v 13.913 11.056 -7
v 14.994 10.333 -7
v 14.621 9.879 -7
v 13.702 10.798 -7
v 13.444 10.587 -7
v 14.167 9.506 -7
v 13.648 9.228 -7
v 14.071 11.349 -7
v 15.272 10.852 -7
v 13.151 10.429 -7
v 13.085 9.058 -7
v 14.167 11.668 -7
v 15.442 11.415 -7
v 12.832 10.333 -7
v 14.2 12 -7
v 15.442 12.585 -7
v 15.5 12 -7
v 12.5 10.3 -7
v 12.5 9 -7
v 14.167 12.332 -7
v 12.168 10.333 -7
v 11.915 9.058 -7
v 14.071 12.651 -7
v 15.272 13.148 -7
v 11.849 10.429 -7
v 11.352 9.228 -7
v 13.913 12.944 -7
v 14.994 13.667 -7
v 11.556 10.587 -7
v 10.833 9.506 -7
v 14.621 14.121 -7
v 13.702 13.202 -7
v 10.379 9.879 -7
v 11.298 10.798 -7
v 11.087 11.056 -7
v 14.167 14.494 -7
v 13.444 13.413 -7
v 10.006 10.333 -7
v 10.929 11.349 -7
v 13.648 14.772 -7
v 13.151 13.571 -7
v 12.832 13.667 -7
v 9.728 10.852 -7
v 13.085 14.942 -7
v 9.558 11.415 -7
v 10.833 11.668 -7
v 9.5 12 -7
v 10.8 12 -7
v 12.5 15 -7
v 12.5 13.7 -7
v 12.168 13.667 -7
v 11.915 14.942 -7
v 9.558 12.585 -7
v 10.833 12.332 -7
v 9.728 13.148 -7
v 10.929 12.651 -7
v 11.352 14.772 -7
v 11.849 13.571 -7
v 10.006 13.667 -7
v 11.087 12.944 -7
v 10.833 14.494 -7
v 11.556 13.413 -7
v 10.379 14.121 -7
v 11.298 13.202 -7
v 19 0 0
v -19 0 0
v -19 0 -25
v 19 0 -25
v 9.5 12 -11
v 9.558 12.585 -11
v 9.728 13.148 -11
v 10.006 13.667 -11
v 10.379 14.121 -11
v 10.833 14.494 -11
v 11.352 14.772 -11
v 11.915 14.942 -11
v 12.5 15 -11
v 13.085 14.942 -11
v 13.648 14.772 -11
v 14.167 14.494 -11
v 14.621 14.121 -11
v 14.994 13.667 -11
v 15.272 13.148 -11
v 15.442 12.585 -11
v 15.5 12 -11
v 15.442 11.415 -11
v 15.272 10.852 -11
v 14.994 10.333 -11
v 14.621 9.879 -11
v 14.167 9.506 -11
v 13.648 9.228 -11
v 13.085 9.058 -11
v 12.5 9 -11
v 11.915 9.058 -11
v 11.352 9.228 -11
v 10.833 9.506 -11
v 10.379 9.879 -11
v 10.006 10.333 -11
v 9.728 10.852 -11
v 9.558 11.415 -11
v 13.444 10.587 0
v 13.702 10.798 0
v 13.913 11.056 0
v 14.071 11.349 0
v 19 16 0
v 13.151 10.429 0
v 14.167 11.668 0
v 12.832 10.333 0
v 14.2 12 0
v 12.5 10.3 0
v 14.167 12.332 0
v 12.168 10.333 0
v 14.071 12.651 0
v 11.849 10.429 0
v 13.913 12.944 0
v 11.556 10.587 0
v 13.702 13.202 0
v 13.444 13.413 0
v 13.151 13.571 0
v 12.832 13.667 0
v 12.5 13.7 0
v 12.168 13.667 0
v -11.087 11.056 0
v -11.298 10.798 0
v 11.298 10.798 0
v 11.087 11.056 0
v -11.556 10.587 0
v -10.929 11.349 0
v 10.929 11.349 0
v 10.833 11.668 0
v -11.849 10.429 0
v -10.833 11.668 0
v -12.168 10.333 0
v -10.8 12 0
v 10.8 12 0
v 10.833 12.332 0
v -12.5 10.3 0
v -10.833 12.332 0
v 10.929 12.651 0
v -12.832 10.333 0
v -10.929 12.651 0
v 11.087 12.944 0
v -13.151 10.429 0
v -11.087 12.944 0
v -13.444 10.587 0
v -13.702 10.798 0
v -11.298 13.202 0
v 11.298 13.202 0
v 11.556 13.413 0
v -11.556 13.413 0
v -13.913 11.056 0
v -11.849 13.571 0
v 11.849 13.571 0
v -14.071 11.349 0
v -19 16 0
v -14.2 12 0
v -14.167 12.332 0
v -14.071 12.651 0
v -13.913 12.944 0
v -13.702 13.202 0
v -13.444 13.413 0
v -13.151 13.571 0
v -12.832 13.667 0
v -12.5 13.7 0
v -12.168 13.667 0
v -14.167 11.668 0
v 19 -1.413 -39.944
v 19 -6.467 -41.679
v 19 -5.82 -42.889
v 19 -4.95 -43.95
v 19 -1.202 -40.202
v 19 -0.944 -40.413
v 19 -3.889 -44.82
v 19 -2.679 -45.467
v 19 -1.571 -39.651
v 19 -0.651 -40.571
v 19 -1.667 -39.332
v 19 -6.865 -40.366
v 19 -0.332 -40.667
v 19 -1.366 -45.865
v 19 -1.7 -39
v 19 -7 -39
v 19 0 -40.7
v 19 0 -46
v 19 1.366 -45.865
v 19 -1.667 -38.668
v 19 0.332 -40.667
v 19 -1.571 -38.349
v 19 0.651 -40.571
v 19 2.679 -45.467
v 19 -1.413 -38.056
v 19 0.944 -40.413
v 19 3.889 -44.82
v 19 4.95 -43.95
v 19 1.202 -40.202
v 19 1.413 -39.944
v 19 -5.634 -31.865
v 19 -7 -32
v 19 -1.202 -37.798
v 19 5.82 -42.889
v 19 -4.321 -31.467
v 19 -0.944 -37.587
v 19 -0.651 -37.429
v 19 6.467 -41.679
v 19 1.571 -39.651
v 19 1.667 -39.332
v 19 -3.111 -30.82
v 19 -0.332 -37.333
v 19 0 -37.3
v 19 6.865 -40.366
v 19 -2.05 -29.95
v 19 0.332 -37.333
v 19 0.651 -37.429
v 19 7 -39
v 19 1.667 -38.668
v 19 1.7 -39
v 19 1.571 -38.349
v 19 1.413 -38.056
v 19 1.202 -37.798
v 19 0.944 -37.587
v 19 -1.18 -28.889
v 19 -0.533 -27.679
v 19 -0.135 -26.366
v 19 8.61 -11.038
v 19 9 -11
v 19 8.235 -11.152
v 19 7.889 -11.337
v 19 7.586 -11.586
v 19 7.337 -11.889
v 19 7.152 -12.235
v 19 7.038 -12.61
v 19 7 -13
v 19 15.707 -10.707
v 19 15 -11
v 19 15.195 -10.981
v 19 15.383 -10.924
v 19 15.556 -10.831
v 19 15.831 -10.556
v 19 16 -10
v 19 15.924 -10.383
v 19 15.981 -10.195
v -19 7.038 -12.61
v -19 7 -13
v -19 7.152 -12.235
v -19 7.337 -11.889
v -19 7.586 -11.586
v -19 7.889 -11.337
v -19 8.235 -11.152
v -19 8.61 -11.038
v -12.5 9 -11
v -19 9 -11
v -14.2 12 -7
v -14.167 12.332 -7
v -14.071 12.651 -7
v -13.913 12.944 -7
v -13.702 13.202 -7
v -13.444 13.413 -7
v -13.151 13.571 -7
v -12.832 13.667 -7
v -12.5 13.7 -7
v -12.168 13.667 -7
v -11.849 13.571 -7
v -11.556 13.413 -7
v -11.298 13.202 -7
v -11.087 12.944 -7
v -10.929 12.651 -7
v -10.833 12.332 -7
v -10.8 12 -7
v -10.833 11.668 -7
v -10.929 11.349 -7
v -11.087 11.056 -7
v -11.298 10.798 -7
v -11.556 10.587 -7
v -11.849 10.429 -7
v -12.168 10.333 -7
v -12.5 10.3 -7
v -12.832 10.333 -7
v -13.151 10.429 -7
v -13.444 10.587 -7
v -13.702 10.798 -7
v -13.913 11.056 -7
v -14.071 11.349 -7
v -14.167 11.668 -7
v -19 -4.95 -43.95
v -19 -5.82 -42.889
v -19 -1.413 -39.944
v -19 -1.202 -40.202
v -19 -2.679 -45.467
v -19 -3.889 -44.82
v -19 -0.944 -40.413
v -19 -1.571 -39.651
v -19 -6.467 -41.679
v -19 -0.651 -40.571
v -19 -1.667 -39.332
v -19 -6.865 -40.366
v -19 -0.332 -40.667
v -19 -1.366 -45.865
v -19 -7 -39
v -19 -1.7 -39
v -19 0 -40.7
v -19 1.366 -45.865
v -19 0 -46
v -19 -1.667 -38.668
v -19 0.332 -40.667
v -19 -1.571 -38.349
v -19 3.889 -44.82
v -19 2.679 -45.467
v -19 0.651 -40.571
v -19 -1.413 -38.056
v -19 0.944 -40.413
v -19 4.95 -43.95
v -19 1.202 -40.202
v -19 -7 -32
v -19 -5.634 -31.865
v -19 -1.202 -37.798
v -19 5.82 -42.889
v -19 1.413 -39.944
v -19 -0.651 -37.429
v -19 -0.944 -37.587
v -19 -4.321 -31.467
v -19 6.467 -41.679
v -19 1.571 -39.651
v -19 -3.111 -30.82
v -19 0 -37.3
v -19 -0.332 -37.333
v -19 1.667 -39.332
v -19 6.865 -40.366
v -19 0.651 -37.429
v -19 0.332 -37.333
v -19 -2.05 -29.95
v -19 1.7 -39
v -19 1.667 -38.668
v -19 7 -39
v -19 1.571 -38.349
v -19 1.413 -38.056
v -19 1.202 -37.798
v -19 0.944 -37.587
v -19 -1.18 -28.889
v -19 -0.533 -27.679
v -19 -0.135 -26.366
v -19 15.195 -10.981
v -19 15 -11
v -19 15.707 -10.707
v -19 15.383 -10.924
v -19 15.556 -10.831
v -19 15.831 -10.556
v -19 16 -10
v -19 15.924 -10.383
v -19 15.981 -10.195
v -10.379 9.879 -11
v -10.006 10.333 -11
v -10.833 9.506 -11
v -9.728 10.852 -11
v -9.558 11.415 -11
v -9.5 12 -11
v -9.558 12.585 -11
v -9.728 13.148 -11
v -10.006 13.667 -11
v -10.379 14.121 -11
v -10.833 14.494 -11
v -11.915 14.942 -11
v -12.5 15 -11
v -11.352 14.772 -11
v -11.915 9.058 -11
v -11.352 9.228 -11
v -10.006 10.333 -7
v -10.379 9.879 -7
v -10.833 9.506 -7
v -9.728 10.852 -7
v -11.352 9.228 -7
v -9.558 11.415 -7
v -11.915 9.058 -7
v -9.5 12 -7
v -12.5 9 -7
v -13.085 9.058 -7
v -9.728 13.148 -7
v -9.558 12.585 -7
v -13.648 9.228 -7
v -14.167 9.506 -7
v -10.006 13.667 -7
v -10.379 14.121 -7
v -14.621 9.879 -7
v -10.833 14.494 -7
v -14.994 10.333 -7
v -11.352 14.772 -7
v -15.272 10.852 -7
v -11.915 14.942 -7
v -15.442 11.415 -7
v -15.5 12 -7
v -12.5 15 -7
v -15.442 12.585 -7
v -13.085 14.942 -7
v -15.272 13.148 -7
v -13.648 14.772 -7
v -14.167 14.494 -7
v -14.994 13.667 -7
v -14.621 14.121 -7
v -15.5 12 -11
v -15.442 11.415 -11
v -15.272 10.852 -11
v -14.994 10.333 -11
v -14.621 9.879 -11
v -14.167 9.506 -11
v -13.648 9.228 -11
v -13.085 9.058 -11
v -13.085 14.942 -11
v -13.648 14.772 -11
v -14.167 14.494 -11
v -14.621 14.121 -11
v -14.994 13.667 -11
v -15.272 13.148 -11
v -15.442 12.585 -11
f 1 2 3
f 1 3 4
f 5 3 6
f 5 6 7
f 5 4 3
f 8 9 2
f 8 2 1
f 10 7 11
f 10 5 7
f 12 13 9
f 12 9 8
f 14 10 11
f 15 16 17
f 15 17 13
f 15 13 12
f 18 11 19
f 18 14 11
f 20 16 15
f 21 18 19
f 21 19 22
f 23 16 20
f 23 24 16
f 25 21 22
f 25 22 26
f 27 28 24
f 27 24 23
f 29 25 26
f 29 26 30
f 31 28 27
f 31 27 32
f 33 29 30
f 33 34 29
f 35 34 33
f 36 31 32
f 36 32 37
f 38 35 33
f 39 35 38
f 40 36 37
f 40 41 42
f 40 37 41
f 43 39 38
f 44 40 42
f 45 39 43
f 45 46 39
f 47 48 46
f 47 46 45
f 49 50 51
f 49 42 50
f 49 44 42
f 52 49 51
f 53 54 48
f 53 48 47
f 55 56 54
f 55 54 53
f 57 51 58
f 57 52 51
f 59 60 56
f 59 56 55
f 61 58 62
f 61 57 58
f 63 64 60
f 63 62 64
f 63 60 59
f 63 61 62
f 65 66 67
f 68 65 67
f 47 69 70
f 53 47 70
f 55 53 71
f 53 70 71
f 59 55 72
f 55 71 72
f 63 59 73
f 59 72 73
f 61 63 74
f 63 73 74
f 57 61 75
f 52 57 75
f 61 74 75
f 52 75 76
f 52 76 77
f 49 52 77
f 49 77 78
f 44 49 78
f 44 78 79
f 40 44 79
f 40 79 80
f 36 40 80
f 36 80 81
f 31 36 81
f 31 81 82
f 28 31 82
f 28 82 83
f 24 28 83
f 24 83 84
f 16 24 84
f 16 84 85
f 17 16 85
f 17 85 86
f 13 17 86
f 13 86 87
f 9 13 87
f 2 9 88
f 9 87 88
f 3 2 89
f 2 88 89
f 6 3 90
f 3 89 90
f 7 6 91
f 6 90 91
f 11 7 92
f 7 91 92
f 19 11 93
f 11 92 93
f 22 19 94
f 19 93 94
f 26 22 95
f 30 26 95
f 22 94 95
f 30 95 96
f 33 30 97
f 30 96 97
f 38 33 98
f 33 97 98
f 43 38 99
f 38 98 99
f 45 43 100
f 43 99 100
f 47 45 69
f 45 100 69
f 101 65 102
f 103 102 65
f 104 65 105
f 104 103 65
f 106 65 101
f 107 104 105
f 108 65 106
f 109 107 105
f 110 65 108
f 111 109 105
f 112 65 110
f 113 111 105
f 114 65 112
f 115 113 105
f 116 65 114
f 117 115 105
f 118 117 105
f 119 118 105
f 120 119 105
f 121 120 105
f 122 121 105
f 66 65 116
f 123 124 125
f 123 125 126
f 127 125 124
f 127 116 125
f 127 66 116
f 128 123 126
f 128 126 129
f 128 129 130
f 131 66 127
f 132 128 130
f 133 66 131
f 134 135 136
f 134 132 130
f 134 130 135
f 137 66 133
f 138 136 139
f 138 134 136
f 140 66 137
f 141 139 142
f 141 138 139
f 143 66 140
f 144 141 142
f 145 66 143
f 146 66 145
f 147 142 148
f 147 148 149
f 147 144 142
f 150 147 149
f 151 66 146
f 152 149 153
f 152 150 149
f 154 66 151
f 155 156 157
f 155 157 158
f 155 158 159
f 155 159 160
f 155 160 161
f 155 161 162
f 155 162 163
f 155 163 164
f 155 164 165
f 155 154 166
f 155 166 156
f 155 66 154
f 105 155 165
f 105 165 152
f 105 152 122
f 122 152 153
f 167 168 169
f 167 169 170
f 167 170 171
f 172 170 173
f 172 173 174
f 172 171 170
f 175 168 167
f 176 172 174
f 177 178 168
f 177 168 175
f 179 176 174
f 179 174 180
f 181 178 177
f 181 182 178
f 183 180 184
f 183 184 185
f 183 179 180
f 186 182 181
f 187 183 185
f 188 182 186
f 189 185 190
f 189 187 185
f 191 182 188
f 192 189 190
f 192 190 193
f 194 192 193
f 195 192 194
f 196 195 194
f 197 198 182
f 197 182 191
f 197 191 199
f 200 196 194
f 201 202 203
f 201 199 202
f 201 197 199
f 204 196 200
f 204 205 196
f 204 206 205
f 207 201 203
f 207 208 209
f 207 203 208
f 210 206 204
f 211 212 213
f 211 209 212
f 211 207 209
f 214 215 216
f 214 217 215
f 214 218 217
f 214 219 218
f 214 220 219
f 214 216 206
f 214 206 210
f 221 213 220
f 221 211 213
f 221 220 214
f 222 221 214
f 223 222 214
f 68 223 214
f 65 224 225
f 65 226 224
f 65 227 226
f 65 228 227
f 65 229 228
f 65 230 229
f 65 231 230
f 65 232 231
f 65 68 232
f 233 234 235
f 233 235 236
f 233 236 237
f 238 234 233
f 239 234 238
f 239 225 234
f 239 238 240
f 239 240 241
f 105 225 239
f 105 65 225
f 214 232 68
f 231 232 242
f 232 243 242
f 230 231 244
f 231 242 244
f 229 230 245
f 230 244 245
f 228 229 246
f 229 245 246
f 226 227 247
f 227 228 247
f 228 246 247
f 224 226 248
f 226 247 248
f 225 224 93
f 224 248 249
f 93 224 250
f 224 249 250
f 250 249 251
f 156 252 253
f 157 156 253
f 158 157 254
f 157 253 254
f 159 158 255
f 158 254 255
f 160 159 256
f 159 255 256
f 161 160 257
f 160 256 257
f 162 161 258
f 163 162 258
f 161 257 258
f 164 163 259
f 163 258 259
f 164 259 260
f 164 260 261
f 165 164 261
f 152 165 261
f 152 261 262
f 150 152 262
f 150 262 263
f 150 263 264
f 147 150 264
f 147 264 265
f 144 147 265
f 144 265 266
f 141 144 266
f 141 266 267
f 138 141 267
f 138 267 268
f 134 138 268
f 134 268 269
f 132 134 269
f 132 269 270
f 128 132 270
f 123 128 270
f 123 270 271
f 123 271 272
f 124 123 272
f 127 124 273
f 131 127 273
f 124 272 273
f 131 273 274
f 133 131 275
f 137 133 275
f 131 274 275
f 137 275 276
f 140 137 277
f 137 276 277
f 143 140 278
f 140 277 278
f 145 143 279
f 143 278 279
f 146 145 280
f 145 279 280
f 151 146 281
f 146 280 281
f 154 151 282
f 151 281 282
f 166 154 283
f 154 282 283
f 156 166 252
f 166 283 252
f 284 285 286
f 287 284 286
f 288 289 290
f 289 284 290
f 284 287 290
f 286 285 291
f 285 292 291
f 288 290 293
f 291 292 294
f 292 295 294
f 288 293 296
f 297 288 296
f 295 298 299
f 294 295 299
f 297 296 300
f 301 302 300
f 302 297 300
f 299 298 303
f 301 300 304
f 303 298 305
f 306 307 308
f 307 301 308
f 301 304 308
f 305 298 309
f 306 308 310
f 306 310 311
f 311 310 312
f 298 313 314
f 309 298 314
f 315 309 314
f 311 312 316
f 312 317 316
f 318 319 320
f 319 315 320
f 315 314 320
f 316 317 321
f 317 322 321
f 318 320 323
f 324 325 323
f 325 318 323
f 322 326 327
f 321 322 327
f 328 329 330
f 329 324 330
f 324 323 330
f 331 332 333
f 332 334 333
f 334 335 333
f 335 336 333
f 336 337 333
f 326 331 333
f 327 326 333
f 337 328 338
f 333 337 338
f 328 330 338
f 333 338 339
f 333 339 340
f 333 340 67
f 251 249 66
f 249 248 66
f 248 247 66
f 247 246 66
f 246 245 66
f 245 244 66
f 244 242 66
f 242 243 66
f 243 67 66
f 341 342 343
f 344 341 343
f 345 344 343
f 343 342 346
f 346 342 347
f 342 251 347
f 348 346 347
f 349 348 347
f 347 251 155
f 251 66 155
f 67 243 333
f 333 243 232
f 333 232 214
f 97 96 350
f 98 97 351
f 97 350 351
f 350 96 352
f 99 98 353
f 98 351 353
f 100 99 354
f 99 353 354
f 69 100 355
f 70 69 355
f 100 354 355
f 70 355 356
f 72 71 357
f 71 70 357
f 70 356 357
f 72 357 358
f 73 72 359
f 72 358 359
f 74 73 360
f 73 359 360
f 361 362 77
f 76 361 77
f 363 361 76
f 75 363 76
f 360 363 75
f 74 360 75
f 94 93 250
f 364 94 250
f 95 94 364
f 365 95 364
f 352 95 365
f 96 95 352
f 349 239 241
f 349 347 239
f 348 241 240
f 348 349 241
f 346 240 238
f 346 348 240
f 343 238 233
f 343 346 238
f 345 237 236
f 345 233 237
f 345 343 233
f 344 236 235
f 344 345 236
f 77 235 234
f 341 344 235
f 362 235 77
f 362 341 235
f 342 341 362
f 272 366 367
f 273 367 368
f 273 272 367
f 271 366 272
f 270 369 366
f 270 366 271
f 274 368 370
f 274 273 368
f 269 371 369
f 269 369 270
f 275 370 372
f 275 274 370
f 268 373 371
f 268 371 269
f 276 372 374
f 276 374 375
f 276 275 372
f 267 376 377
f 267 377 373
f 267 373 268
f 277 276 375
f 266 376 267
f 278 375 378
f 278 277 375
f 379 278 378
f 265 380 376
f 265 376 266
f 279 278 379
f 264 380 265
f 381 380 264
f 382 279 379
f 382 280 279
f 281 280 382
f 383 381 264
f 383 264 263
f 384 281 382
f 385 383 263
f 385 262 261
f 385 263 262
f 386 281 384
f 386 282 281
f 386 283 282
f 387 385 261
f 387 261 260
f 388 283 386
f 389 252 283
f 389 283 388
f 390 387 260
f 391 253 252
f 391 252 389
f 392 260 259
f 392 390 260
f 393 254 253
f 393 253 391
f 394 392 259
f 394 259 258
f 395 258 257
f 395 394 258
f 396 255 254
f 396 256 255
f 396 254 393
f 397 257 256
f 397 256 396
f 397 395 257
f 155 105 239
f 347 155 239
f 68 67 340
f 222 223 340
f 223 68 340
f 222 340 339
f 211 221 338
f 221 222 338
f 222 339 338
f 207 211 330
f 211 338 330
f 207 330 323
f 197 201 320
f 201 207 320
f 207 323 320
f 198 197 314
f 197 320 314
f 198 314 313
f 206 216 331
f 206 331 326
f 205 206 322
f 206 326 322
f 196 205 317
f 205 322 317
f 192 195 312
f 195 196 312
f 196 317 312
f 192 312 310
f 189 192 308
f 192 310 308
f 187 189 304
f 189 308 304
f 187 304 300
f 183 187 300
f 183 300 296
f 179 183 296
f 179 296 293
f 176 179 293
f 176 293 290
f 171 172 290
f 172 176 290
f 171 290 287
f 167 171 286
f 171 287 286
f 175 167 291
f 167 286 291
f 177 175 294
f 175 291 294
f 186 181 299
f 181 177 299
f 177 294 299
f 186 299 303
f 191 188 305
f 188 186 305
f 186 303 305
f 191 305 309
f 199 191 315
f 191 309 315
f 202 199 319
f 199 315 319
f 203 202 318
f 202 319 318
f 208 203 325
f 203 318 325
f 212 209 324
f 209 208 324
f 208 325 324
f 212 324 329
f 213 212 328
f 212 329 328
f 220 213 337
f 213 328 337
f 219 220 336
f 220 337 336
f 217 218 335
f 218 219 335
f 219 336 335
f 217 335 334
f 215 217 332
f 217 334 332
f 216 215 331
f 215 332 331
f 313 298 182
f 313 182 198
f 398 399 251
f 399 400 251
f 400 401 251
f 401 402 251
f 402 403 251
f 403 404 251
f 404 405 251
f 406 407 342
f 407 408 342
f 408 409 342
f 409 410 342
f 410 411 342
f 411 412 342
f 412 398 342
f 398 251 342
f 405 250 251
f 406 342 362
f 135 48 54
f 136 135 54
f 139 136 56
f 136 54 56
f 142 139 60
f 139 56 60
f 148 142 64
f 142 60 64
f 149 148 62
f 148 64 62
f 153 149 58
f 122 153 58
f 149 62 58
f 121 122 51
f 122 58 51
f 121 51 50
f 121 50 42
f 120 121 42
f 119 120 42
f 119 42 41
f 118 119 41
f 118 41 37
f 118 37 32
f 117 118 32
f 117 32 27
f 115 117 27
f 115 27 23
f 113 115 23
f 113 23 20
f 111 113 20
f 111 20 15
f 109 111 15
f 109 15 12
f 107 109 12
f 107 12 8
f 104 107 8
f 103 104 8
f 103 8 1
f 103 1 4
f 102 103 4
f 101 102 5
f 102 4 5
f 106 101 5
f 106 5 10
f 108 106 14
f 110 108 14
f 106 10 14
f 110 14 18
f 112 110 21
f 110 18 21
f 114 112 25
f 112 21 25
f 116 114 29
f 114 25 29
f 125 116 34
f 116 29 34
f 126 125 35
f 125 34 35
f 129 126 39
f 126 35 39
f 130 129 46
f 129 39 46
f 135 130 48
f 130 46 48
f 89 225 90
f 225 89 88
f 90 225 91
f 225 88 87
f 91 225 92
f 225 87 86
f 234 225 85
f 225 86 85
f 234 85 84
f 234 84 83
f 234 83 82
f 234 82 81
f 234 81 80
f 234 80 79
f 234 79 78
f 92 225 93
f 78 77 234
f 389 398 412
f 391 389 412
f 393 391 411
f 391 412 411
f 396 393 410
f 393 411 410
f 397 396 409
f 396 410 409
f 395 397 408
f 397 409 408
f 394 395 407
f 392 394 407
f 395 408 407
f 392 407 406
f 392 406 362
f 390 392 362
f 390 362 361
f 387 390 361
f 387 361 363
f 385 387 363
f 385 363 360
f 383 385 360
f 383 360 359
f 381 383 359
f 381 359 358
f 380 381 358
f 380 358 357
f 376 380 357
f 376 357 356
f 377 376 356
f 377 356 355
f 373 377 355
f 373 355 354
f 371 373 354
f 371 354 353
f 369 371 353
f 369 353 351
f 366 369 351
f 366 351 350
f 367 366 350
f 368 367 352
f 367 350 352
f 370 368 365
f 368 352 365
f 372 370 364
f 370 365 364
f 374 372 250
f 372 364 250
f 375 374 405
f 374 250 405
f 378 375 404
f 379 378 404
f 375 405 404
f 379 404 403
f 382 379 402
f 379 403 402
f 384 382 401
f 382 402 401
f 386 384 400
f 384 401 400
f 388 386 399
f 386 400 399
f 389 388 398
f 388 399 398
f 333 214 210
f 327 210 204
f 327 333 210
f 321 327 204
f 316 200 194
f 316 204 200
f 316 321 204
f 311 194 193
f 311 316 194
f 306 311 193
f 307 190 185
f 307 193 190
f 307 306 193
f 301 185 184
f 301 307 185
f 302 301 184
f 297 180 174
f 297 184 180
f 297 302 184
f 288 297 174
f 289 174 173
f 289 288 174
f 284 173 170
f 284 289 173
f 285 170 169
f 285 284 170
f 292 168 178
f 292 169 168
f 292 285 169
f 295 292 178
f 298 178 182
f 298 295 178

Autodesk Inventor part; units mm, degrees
ref_plane "YZ Plane" through (0, 0, 0) normal (1, 0, 0) x (0, 1, 0)
ref_plane "XZ Plane" through (0, 0, 0) normal (0, 1, 0) x (-1, 0, 0)
ref_plane "XY Plane" through (0, 0, 0) normal (0, 0, 1) x (1, 0, 0)
sketch "Skizze1" plane through (0, 0, 0) normal (1, 0, 0) x (0, 1, 0)
  line L0 (0, 0) -> (0, -25)
  line L1 (0, 0) -> (16, 0)
  line L2 (16, 0) -> (16, -39)
  line L3 (9, -46) -> (-7, -46)
  arc A0 (-7, -32) -> (0, -25) centre (-7, -25) ccw
  line L4 (-7, -46) -> (-7, -32)
  arc A1 (9, -46) -> (16, -39) centre (9, -39) ccw
  circle A2 centre (0, -39) radius 7 construction
  circle A3 centre (0, -39) radius 1.7
  arc A4 (9, -11) -> (7, -13) centre (9, -13) ccw
  line L5 (9, -11) -> (16, -11)
  line L6 (7, -13) -> (7, -46)
  arc A5 (-7, -39) -> (7, -39) centre (0, -39) ccw
  arc A6 (15, -11) -> (16, -10) centre (15, -10) ccw
  dimension "d2" = 14
  dimension "d3" = 16
  dimension "d7" = 14
  dimension "d8" = 3.4
  dimension "d11" = 39
  dimension "d15" = 11
  dimension "d16" = 2
  dimension "d24" = 1
extrude "Extrusion1" add sketch "Skizze1" along normal mid plane 38 contours L1 L2 A6 L5 A4 L6 A5 L4 A0 L0
sketch "Skizze2" plane through (19, 16, -11) normal (0, 0, -1) x (-1, 0, 0)
  line L0 (0, -7) -> (0, -1) projected
  line L1 (38, -7) -> (0, -7) projected
  line L2 (38, -1) -> (38, -7) projected
  line L3 (19, -1) -> (19, -7) construction
  line L4 (38, -7) -> (0, -7) projected
  circle A0 centre (6.5, -4) radius 1.7
  circle A1 centre (31.5, -4) radius 1.7
  circle A2 centre (6.5, -4) radius 3
  circle A3 centre (31.5, -4) radius 3
  line L5 (38, -1) -> (0, -1) projected
  point P0 (19, -16)
  dimension "d17" = 3.4
  dimension "d18" = 6
  dimension "d19" = 25
extrude "Extrusion2" cut sketch "Skizze2" against normal through all contours A0 | A1
extrude "Extrusion3" cut sketch "Skizze2" against normal blind 4 contours A2 | A3
equation "\"d2\" = d7"
properties part number "Skirt Mount" material "ABS-Kunststoff"
